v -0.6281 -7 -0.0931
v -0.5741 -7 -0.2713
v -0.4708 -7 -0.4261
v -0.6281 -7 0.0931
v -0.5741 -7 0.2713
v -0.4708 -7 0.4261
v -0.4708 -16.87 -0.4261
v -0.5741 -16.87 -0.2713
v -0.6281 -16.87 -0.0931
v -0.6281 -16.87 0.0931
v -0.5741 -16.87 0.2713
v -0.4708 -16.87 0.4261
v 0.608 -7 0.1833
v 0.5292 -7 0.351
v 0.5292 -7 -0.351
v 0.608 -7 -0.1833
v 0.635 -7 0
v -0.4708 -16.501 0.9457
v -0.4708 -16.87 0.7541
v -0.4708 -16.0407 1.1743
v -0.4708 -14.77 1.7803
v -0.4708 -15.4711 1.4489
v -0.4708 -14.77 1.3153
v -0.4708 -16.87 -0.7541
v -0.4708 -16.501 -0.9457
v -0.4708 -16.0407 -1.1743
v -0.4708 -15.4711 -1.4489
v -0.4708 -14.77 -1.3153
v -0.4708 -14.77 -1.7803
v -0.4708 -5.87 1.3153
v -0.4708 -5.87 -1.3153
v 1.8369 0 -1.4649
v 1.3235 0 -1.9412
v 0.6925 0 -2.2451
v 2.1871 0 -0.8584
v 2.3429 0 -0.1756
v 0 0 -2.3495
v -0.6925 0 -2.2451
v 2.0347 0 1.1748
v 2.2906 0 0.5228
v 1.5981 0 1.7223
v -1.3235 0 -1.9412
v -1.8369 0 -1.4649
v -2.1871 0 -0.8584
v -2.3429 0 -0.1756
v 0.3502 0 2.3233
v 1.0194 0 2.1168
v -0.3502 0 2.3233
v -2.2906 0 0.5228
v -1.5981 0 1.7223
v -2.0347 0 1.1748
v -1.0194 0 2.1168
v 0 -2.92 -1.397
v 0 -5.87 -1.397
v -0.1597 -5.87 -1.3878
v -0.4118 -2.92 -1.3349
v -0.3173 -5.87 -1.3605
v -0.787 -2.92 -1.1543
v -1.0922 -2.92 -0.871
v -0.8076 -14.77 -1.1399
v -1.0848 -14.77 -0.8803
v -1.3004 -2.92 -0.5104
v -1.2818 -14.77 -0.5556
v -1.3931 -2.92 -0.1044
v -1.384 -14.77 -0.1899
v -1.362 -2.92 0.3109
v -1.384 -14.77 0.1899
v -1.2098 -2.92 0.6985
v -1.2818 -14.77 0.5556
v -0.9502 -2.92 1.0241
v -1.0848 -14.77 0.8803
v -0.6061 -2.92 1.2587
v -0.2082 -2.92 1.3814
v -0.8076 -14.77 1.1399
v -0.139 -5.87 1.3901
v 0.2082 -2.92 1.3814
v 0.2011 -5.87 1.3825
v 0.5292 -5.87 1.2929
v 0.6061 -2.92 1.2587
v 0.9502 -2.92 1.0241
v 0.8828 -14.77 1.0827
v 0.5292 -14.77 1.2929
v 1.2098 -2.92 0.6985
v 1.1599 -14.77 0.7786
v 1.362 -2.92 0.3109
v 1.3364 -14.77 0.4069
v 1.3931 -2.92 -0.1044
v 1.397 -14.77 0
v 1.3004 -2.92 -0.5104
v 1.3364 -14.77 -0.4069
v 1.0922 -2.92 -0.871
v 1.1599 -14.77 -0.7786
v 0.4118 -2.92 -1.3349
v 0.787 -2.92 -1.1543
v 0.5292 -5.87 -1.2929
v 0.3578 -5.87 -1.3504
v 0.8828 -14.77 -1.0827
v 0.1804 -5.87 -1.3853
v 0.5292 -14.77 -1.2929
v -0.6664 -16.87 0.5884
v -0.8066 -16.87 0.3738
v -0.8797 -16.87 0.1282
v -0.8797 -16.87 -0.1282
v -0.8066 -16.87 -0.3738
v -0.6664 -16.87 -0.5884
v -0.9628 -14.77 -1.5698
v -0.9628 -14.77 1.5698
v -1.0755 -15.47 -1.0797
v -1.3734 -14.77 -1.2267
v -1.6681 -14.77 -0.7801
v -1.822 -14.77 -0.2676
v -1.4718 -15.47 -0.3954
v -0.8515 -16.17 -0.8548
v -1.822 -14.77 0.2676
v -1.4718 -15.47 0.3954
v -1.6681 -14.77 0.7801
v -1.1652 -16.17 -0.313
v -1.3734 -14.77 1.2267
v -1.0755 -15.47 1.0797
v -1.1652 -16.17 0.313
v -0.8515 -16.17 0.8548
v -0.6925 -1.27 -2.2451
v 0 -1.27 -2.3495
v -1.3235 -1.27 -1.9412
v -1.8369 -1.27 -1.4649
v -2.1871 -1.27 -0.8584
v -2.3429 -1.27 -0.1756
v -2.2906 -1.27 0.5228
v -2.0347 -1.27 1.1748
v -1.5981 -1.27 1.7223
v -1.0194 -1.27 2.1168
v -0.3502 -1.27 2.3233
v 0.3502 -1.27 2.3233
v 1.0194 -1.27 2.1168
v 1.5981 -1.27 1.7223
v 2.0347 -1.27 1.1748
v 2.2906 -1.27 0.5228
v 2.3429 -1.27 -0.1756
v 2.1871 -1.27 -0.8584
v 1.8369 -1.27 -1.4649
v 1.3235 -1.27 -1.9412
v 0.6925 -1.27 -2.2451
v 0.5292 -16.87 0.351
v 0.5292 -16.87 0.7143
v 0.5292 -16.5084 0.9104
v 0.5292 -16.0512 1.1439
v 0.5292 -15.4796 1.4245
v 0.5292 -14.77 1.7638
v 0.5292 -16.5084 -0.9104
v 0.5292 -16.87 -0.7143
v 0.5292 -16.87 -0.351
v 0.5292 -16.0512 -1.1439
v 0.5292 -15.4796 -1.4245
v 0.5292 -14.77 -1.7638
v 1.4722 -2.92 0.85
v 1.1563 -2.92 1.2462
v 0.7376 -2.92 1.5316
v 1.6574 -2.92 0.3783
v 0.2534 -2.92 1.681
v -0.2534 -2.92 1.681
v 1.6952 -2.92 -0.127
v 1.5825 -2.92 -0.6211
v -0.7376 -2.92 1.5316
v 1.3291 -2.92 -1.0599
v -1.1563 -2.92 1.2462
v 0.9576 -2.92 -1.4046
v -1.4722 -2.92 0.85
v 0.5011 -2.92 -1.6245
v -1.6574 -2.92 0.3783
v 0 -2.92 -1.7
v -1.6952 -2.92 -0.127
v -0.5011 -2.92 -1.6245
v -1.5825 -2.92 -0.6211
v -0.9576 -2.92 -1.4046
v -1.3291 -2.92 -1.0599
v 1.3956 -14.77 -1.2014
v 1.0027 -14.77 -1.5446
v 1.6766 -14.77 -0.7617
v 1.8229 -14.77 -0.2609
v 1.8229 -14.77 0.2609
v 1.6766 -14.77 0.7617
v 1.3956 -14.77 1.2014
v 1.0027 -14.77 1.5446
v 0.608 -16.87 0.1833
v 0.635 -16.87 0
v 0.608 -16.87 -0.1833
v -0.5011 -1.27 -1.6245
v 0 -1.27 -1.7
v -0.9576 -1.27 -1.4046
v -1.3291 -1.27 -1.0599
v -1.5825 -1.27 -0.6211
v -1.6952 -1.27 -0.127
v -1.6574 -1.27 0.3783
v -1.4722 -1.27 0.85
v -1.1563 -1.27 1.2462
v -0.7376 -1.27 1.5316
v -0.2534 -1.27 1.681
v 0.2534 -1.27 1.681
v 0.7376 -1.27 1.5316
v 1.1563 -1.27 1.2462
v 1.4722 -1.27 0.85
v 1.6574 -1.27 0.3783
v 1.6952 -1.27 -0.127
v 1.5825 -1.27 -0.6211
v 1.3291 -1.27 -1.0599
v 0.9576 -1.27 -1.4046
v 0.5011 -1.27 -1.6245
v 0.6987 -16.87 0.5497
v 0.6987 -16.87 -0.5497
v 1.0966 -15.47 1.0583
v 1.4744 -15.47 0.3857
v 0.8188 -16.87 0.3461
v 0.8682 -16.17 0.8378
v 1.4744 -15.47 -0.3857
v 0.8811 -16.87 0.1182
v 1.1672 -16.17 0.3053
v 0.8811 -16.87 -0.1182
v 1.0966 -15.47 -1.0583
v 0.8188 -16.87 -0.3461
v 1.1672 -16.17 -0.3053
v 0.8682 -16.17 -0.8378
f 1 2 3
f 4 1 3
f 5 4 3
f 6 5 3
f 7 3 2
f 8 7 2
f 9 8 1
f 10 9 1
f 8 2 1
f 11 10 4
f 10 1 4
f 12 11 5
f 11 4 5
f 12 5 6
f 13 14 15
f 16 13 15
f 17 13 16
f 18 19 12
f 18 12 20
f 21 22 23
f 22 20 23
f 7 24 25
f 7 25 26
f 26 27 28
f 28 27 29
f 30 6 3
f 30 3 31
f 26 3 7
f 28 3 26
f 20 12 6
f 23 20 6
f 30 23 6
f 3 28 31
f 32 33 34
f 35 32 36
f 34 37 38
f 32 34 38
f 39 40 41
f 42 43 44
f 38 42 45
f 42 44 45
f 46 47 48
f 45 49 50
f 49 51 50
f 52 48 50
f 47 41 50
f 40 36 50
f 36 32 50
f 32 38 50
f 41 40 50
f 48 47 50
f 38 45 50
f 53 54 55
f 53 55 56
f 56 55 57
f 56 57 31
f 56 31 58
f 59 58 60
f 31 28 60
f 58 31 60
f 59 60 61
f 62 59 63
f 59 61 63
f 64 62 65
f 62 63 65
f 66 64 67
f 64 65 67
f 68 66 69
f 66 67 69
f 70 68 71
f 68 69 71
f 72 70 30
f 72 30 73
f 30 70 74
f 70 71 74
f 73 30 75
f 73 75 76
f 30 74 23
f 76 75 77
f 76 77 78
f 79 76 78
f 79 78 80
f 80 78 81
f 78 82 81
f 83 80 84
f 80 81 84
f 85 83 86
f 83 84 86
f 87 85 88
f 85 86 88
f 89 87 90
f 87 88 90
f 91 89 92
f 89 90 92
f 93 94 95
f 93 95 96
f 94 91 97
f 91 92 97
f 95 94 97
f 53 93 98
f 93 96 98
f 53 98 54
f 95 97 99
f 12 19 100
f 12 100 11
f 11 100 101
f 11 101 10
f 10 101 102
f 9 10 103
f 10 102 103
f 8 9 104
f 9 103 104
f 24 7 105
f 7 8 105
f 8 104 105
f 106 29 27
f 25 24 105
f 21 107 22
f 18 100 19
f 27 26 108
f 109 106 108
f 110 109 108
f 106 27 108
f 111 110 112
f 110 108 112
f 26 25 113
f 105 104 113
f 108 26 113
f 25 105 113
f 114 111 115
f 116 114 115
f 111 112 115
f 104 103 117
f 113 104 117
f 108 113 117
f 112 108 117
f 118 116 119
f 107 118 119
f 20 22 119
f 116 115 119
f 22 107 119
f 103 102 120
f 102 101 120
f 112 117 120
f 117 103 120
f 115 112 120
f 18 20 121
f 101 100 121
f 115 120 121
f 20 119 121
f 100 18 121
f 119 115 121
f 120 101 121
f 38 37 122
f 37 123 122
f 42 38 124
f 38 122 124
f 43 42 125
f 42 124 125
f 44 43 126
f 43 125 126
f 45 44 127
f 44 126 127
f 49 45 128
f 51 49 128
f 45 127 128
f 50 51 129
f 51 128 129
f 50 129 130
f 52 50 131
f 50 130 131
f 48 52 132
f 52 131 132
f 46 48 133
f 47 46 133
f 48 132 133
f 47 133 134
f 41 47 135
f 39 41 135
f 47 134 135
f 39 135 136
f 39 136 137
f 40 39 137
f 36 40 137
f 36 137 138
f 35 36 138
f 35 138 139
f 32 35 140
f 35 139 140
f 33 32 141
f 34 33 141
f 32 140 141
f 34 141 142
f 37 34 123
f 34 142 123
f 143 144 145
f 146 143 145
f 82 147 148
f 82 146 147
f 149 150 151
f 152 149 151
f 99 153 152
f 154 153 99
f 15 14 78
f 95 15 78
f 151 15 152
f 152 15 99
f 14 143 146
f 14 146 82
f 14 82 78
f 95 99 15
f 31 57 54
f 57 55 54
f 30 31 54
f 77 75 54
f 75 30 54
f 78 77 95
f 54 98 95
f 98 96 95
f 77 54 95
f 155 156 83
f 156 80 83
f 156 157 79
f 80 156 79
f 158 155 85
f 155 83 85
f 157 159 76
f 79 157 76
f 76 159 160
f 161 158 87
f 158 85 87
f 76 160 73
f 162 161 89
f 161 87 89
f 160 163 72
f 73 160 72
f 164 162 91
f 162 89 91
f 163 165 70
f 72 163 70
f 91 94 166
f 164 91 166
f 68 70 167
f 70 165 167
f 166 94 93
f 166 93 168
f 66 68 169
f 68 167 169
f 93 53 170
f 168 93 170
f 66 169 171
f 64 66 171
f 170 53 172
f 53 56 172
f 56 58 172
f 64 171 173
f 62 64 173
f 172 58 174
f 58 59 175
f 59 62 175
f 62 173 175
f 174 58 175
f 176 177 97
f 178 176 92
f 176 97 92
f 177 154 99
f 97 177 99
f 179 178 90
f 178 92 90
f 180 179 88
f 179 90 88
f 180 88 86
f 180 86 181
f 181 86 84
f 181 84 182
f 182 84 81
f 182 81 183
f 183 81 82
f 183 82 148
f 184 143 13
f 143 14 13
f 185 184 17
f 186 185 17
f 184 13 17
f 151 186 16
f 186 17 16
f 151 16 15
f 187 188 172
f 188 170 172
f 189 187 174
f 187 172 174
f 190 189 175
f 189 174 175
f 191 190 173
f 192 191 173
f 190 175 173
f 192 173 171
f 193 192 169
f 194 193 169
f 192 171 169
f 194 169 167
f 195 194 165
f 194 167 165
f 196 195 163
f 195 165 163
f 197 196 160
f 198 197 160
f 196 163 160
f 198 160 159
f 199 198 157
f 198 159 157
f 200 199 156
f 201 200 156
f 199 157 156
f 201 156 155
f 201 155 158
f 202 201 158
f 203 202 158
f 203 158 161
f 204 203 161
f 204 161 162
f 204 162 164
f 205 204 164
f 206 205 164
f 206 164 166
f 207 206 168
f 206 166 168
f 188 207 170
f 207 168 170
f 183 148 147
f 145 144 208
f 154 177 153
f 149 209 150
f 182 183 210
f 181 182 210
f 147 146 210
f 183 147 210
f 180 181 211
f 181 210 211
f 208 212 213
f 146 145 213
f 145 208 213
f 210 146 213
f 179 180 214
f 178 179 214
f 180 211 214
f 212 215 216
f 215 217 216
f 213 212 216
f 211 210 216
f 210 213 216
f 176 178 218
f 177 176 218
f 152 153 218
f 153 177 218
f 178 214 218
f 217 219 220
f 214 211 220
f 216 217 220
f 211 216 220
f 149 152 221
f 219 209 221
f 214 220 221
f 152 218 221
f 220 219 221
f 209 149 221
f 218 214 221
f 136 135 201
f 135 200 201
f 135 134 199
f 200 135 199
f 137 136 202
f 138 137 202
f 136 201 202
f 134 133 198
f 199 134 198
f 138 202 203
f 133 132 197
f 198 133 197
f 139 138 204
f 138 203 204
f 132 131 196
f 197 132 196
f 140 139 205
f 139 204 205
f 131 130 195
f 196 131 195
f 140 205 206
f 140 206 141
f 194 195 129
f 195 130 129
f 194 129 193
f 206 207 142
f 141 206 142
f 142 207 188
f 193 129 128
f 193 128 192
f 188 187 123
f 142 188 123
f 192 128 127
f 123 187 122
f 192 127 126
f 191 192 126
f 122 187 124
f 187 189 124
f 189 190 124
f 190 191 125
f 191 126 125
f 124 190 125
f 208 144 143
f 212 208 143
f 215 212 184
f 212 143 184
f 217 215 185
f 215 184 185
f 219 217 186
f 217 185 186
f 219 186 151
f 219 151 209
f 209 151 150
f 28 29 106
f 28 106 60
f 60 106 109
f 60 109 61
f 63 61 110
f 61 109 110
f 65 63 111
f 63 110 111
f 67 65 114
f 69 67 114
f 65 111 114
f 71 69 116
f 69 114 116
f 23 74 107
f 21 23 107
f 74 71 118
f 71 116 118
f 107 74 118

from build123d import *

# Parameters (mm, degrees)
CUT_EXTRUDE1_DEPTH      = 18.194103655
CUT_EXTRUDE1_DEPTH_BACK = 18.194103655
SKETCH3_W               = 1
SKETCH3_H               = 11


with BuildPart() as part:
    # Sketch1 → Revolve1 (revolve)
    with BuildSketch(Plane.XY, mode=Mode.PRIVATE) as revolve1_sk:
        Polygon((0, -7), (0, 0), (2.3495, 0), (2.3495, -1.27), (1.7, -1.27), (1.7, -2.92), (1.397, -2.92), (1.397, -14.77), (1.8415, -14.77), (0.889, -16.87), (0.635, -16.87), (0.635, -7), align=None)
    revolve(revolve1_sk.sketch.rotate(Axis((0, -7, 0), (0, 1, 0)), 90), axis=Axis((0, -7, 0), (0, 1, 0)))

    # Sketch3 → Cut-Extrude1 (cut, two sides: drawn at the far end of the back side and taken through both)
    with BuildSketch(Plane.XY.offset(-CUT_EXTRUDE1_DEPTH_BACK)):
        with Locations((0.029190269, -11.37)):
            Rectangle(SKETCH3_W, SKETCH3_H)
    extrude(amount=CUT_EXTRUDE1_DEPTH + CUT_EXTRUDE1_DEPTH_BACK, mode=Mode.SUBTRACT)


solid = part.part
